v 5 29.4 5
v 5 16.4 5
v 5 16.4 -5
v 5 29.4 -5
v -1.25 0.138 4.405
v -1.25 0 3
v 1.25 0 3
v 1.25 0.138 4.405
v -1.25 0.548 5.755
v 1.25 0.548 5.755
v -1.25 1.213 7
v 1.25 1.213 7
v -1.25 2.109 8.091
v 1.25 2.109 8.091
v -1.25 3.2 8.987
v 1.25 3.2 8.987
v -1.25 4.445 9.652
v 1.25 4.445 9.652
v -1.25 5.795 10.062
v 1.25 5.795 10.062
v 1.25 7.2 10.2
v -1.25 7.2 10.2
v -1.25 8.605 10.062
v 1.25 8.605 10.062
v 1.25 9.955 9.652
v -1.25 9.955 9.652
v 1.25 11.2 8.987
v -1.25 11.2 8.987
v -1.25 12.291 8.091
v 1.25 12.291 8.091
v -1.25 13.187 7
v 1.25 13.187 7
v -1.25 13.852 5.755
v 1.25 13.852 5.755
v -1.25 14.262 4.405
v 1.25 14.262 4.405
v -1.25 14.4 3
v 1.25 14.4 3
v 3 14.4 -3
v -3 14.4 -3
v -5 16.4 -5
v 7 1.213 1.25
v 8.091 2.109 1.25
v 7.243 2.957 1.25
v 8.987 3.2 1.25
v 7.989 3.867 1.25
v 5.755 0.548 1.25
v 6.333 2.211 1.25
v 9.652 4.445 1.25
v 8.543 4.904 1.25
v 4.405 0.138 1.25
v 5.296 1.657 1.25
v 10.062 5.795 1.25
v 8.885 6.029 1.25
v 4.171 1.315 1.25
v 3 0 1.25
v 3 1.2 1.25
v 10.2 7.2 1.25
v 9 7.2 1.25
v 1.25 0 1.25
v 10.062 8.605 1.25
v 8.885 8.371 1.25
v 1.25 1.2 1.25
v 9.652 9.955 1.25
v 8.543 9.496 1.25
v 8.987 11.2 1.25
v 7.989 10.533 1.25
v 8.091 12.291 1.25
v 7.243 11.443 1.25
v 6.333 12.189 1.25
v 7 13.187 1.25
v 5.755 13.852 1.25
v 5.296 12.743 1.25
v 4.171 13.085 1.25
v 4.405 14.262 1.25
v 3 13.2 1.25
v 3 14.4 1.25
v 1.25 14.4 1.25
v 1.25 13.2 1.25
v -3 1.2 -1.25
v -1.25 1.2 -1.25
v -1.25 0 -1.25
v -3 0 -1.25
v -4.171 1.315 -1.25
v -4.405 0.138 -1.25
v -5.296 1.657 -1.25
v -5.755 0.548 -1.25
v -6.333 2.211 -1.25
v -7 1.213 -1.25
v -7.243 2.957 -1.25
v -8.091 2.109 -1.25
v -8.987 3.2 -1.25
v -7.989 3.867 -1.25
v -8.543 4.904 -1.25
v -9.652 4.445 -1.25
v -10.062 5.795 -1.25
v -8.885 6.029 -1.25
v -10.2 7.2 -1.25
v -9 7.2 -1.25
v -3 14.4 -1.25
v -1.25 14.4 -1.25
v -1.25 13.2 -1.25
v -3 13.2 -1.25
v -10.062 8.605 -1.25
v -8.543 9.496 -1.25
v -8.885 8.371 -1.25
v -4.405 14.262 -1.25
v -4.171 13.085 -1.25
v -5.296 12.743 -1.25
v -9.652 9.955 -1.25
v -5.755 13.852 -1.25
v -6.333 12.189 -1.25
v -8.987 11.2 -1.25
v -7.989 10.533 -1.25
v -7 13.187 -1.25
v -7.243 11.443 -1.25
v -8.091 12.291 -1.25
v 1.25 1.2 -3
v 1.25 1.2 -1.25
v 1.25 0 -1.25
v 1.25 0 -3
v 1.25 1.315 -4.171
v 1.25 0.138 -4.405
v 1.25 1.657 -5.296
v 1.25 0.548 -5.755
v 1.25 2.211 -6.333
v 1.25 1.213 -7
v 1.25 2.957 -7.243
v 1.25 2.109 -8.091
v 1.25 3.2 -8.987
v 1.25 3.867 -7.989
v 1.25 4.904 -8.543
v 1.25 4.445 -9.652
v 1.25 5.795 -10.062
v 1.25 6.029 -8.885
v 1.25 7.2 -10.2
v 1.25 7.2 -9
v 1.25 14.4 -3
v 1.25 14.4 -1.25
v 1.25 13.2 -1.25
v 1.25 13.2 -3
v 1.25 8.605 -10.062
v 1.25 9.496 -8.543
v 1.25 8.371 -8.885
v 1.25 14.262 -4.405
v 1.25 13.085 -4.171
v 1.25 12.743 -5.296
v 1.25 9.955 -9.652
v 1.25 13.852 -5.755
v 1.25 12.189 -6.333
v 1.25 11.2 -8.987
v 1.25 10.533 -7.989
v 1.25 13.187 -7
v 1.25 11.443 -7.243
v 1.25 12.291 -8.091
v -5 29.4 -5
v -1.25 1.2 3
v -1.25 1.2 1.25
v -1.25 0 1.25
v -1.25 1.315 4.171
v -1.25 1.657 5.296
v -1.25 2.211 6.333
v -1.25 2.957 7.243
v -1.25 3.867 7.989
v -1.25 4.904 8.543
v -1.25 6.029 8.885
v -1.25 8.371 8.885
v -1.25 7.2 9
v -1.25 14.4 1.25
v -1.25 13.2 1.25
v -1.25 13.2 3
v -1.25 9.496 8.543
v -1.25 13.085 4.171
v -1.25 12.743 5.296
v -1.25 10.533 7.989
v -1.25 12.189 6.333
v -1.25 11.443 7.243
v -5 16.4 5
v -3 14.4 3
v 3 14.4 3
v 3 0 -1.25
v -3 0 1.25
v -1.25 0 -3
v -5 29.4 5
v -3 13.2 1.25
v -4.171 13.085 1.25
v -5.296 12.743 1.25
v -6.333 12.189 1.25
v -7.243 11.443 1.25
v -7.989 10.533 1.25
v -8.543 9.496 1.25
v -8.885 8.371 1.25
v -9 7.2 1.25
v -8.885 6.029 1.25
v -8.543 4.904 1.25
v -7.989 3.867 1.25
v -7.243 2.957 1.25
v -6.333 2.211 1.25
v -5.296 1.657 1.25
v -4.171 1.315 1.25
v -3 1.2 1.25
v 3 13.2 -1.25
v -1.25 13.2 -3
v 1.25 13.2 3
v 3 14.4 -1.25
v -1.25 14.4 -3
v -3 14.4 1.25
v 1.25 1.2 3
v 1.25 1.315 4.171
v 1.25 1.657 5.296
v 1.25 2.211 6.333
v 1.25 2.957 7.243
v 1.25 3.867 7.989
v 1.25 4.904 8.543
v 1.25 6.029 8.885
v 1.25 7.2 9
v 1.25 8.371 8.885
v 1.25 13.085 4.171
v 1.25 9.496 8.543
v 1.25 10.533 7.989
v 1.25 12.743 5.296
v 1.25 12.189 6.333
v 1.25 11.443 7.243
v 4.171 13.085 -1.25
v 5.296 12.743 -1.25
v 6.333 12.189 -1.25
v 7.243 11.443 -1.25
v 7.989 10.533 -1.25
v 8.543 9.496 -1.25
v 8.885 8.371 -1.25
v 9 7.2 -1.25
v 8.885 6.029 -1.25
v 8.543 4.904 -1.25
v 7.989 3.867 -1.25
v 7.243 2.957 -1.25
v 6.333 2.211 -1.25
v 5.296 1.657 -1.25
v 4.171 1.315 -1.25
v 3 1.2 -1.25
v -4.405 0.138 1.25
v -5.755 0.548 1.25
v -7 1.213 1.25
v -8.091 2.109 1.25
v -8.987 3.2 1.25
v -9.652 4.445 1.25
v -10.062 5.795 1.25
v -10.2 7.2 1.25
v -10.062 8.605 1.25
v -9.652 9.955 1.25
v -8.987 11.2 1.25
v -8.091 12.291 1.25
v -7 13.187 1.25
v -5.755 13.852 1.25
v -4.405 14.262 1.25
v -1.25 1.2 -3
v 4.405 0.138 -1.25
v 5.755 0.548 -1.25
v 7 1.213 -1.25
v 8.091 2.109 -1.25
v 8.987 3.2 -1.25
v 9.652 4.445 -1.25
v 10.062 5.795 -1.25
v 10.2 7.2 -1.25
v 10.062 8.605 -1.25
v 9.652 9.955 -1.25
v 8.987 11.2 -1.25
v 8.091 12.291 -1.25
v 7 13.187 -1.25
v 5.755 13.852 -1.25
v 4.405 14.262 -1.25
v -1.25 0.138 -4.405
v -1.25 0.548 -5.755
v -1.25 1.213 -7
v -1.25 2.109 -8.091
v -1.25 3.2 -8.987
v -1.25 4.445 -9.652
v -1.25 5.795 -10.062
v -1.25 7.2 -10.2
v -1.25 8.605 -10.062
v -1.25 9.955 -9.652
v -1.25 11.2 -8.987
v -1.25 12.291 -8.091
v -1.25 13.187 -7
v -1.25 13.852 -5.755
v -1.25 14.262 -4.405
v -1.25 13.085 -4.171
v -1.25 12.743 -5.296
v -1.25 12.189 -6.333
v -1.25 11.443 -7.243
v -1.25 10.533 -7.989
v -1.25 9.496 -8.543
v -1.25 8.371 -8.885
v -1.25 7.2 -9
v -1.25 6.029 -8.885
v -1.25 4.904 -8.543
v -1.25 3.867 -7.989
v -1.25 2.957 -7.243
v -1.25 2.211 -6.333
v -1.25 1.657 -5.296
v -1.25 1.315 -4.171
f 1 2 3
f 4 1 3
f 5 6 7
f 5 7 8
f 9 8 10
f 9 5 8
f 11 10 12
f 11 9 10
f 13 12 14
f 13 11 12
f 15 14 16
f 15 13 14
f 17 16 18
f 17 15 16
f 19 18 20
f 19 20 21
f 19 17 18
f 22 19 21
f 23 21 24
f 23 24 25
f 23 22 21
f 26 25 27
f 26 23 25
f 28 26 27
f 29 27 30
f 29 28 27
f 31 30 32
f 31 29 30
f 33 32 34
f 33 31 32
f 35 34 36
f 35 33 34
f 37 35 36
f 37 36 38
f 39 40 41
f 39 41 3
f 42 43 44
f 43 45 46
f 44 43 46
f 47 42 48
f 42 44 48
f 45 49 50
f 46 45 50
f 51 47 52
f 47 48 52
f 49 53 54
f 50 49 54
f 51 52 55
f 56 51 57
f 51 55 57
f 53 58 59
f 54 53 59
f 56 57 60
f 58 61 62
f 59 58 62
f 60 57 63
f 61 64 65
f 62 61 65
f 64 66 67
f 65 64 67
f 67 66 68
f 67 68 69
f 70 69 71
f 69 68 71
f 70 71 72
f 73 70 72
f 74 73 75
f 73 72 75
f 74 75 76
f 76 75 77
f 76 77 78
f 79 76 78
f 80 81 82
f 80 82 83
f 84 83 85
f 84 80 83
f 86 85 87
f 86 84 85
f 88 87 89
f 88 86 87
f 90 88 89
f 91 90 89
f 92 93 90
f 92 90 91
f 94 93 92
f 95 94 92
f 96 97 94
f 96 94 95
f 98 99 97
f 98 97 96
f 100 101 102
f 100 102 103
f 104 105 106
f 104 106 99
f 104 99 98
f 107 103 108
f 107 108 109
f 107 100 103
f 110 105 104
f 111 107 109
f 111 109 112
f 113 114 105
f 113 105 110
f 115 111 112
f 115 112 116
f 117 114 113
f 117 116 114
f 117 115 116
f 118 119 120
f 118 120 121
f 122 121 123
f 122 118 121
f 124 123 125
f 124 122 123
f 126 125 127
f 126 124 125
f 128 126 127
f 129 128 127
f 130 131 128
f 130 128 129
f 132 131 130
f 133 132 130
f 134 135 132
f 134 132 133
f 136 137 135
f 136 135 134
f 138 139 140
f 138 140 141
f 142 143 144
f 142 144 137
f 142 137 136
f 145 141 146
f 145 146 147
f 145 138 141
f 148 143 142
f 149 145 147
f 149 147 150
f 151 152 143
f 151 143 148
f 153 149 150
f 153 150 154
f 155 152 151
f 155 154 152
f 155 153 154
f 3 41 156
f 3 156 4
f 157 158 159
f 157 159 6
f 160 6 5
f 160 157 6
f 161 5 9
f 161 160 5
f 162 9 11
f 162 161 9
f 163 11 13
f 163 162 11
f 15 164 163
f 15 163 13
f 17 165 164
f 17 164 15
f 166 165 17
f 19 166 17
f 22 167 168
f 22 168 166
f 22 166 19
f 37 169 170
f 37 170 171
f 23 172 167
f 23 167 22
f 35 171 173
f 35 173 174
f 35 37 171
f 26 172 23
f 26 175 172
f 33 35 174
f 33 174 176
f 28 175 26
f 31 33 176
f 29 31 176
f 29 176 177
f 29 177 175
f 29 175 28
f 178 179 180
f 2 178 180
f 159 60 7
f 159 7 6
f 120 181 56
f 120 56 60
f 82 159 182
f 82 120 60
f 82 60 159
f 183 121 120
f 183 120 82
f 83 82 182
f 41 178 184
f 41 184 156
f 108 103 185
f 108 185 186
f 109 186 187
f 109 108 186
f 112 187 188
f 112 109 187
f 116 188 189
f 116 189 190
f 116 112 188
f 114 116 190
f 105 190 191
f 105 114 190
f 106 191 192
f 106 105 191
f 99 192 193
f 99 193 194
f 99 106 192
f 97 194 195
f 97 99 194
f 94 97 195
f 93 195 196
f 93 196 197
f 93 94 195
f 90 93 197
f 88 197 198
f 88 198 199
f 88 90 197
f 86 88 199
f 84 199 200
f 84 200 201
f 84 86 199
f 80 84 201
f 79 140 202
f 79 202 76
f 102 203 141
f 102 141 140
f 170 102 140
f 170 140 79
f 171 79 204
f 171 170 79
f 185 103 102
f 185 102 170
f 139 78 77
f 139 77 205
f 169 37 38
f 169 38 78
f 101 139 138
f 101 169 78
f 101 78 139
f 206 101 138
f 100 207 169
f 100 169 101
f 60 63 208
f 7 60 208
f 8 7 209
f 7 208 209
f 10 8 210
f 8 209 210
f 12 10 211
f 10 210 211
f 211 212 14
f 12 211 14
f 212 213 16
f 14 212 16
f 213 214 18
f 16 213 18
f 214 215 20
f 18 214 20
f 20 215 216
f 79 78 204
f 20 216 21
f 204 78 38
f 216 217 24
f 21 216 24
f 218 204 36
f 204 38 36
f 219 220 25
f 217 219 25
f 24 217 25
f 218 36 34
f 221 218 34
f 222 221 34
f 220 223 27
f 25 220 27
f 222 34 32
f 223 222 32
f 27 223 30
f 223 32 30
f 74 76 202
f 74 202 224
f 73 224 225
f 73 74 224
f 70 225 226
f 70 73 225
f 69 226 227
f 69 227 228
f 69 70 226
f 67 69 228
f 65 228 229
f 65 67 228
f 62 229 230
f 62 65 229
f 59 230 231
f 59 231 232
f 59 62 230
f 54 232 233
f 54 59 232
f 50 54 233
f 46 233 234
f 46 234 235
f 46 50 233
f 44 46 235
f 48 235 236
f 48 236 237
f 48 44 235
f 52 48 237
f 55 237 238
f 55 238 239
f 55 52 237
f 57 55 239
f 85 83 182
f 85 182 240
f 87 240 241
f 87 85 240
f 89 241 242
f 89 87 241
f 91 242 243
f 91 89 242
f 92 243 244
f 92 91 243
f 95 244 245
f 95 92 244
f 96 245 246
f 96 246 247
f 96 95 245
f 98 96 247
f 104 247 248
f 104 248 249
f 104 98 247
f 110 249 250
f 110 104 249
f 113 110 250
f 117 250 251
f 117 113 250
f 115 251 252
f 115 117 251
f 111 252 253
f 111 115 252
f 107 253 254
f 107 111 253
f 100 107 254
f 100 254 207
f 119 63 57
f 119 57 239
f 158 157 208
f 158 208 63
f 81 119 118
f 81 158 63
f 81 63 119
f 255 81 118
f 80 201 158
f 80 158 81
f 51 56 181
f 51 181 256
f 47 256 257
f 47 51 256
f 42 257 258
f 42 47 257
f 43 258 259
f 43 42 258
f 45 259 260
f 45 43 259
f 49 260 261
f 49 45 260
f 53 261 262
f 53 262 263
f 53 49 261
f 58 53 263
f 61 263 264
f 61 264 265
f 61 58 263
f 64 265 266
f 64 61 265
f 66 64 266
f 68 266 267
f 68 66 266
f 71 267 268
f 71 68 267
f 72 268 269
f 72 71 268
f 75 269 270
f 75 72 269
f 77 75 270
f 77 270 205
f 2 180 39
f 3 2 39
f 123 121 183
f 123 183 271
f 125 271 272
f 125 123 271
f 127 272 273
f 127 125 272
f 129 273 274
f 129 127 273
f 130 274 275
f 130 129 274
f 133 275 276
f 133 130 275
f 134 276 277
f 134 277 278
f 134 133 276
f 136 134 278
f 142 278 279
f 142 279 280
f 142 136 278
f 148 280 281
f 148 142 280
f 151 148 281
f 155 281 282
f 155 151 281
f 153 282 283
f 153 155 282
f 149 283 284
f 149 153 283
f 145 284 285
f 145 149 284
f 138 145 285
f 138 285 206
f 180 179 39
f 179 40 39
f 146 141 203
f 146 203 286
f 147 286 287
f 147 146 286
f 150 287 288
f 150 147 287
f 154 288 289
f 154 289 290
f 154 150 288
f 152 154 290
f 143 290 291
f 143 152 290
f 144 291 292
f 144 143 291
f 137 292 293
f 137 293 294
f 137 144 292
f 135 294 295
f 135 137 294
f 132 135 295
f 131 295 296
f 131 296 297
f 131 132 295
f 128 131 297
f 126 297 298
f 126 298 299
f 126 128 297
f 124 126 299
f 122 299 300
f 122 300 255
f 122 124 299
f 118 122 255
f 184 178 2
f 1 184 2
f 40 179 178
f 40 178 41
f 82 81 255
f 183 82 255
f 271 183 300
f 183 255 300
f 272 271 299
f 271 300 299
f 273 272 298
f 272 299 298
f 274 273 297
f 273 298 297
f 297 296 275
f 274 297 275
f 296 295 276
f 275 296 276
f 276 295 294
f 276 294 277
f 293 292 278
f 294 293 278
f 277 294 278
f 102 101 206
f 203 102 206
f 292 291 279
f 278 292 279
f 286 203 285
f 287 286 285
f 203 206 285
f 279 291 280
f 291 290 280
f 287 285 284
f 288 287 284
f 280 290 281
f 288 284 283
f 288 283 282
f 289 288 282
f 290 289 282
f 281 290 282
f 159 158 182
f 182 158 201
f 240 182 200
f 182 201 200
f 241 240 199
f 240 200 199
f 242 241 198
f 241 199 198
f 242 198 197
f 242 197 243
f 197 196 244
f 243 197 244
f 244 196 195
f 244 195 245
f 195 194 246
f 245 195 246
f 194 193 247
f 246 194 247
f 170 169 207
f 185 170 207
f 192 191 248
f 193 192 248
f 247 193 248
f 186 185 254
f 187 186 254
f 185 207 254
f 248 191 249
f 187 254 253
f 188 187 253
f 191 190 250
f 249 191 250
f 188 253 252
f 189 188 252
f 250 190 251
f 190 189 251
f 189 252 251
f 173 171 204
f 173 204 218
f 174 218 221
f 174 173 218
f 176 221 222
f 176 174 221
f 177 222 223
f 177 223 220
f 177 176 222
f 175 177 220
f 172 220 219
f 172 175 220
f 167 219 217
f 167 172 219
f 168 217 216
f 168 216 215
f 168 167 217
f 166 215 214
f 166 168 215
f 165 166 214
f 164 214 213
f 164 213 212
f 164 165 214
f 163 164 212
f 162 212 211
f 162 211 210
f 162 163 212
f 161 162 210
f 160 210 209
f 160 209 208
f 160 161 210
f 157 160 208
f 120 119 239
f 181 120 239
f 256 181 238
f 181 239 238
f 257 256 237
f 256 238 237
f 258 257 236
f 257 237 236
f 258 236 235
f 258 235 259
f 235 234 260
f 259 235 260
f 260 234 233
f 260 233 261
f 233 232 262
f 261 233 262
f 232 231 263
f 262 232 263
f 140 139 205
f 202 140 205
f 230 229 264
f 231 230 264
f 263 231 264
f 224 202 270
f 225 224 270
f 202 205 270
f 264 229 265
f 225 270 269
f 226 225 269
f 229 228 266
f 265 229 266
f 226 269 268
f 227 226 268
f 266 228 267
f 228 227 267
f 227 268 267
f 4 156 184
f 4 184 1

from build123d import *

# Parameters (mm, degrees)
BOSS_EXTRUDE1_DEPTH = 1.25
CIRPATTERN1_COUNT   = 4
SKETCH2_W           = 10
SKETCH2_H           = 10
BOSS_EXTRUDE2_DEPTH = 15
CHAMFER1_SIZE       = 2


with BuildPart() as part:
    # Sketch1 → Boss-Extrude1 (new, symmetric)
    with BuildSketch(Plane.XY):
        with BuildLine():
            Line((0, 0), (3, 0))
            ThreePointArc((3, 0), (10.2, 7.2), (3, 14.4))
            Line((3, 14.4), (0, 14.4))
            Line((0, 14.4), (0, 13.2))
            Line((0, 13.2), (3, 13.2))
            ThreePointArc((3, 13.2), (9, 7.2), (3, 1.2))
            Line((3, 1.2), (0, 1.2))
            Line((0, 1.2), (0, 0))
        make_face()
    boss_extrude1 = extrude(amount=BOSS_EXTRUDE1_DEPTH, both=True)

    # CirPattern1: Boss-Extrude1 ×4 about axis
    cirpattern1_axis = Axis((0, 0, 0), (0, 1, 0))
    for i in range(1, CIRPATTERN1_COUNT):
        add(boss_extrude1.rotate(cirpattern1_axis, i * 360 / CIRPATTERN1_COUNT))


with BuildPart() as body_2:
    # Sketch2 → Boss-Extrude2 (new body)
    with BuildSketch(Plane(origin=(0, 14.4, 0), x_dir=(1, 0, 0), z_dir=(0, 1, 0))):
        Rectangle(SKETCH2_W, SKETCH2_H)
    extrude(amount=BOSS_EXTRUDE2_DEPTH)

    # Chamfer1
    chamfer1_edges = [body_2.edges().sort_by_distance(p)[0] for p in [
        (0, 14.4, 5),
        (-5, 14.4, 0),
        (0, 14.4, -5),
        (5, 14.4, 0),
    ]]
    chamfer(chamfer1_edges, length=CHAMFER1_SIZE)


solid = Compound([part.part, body_2.part])
